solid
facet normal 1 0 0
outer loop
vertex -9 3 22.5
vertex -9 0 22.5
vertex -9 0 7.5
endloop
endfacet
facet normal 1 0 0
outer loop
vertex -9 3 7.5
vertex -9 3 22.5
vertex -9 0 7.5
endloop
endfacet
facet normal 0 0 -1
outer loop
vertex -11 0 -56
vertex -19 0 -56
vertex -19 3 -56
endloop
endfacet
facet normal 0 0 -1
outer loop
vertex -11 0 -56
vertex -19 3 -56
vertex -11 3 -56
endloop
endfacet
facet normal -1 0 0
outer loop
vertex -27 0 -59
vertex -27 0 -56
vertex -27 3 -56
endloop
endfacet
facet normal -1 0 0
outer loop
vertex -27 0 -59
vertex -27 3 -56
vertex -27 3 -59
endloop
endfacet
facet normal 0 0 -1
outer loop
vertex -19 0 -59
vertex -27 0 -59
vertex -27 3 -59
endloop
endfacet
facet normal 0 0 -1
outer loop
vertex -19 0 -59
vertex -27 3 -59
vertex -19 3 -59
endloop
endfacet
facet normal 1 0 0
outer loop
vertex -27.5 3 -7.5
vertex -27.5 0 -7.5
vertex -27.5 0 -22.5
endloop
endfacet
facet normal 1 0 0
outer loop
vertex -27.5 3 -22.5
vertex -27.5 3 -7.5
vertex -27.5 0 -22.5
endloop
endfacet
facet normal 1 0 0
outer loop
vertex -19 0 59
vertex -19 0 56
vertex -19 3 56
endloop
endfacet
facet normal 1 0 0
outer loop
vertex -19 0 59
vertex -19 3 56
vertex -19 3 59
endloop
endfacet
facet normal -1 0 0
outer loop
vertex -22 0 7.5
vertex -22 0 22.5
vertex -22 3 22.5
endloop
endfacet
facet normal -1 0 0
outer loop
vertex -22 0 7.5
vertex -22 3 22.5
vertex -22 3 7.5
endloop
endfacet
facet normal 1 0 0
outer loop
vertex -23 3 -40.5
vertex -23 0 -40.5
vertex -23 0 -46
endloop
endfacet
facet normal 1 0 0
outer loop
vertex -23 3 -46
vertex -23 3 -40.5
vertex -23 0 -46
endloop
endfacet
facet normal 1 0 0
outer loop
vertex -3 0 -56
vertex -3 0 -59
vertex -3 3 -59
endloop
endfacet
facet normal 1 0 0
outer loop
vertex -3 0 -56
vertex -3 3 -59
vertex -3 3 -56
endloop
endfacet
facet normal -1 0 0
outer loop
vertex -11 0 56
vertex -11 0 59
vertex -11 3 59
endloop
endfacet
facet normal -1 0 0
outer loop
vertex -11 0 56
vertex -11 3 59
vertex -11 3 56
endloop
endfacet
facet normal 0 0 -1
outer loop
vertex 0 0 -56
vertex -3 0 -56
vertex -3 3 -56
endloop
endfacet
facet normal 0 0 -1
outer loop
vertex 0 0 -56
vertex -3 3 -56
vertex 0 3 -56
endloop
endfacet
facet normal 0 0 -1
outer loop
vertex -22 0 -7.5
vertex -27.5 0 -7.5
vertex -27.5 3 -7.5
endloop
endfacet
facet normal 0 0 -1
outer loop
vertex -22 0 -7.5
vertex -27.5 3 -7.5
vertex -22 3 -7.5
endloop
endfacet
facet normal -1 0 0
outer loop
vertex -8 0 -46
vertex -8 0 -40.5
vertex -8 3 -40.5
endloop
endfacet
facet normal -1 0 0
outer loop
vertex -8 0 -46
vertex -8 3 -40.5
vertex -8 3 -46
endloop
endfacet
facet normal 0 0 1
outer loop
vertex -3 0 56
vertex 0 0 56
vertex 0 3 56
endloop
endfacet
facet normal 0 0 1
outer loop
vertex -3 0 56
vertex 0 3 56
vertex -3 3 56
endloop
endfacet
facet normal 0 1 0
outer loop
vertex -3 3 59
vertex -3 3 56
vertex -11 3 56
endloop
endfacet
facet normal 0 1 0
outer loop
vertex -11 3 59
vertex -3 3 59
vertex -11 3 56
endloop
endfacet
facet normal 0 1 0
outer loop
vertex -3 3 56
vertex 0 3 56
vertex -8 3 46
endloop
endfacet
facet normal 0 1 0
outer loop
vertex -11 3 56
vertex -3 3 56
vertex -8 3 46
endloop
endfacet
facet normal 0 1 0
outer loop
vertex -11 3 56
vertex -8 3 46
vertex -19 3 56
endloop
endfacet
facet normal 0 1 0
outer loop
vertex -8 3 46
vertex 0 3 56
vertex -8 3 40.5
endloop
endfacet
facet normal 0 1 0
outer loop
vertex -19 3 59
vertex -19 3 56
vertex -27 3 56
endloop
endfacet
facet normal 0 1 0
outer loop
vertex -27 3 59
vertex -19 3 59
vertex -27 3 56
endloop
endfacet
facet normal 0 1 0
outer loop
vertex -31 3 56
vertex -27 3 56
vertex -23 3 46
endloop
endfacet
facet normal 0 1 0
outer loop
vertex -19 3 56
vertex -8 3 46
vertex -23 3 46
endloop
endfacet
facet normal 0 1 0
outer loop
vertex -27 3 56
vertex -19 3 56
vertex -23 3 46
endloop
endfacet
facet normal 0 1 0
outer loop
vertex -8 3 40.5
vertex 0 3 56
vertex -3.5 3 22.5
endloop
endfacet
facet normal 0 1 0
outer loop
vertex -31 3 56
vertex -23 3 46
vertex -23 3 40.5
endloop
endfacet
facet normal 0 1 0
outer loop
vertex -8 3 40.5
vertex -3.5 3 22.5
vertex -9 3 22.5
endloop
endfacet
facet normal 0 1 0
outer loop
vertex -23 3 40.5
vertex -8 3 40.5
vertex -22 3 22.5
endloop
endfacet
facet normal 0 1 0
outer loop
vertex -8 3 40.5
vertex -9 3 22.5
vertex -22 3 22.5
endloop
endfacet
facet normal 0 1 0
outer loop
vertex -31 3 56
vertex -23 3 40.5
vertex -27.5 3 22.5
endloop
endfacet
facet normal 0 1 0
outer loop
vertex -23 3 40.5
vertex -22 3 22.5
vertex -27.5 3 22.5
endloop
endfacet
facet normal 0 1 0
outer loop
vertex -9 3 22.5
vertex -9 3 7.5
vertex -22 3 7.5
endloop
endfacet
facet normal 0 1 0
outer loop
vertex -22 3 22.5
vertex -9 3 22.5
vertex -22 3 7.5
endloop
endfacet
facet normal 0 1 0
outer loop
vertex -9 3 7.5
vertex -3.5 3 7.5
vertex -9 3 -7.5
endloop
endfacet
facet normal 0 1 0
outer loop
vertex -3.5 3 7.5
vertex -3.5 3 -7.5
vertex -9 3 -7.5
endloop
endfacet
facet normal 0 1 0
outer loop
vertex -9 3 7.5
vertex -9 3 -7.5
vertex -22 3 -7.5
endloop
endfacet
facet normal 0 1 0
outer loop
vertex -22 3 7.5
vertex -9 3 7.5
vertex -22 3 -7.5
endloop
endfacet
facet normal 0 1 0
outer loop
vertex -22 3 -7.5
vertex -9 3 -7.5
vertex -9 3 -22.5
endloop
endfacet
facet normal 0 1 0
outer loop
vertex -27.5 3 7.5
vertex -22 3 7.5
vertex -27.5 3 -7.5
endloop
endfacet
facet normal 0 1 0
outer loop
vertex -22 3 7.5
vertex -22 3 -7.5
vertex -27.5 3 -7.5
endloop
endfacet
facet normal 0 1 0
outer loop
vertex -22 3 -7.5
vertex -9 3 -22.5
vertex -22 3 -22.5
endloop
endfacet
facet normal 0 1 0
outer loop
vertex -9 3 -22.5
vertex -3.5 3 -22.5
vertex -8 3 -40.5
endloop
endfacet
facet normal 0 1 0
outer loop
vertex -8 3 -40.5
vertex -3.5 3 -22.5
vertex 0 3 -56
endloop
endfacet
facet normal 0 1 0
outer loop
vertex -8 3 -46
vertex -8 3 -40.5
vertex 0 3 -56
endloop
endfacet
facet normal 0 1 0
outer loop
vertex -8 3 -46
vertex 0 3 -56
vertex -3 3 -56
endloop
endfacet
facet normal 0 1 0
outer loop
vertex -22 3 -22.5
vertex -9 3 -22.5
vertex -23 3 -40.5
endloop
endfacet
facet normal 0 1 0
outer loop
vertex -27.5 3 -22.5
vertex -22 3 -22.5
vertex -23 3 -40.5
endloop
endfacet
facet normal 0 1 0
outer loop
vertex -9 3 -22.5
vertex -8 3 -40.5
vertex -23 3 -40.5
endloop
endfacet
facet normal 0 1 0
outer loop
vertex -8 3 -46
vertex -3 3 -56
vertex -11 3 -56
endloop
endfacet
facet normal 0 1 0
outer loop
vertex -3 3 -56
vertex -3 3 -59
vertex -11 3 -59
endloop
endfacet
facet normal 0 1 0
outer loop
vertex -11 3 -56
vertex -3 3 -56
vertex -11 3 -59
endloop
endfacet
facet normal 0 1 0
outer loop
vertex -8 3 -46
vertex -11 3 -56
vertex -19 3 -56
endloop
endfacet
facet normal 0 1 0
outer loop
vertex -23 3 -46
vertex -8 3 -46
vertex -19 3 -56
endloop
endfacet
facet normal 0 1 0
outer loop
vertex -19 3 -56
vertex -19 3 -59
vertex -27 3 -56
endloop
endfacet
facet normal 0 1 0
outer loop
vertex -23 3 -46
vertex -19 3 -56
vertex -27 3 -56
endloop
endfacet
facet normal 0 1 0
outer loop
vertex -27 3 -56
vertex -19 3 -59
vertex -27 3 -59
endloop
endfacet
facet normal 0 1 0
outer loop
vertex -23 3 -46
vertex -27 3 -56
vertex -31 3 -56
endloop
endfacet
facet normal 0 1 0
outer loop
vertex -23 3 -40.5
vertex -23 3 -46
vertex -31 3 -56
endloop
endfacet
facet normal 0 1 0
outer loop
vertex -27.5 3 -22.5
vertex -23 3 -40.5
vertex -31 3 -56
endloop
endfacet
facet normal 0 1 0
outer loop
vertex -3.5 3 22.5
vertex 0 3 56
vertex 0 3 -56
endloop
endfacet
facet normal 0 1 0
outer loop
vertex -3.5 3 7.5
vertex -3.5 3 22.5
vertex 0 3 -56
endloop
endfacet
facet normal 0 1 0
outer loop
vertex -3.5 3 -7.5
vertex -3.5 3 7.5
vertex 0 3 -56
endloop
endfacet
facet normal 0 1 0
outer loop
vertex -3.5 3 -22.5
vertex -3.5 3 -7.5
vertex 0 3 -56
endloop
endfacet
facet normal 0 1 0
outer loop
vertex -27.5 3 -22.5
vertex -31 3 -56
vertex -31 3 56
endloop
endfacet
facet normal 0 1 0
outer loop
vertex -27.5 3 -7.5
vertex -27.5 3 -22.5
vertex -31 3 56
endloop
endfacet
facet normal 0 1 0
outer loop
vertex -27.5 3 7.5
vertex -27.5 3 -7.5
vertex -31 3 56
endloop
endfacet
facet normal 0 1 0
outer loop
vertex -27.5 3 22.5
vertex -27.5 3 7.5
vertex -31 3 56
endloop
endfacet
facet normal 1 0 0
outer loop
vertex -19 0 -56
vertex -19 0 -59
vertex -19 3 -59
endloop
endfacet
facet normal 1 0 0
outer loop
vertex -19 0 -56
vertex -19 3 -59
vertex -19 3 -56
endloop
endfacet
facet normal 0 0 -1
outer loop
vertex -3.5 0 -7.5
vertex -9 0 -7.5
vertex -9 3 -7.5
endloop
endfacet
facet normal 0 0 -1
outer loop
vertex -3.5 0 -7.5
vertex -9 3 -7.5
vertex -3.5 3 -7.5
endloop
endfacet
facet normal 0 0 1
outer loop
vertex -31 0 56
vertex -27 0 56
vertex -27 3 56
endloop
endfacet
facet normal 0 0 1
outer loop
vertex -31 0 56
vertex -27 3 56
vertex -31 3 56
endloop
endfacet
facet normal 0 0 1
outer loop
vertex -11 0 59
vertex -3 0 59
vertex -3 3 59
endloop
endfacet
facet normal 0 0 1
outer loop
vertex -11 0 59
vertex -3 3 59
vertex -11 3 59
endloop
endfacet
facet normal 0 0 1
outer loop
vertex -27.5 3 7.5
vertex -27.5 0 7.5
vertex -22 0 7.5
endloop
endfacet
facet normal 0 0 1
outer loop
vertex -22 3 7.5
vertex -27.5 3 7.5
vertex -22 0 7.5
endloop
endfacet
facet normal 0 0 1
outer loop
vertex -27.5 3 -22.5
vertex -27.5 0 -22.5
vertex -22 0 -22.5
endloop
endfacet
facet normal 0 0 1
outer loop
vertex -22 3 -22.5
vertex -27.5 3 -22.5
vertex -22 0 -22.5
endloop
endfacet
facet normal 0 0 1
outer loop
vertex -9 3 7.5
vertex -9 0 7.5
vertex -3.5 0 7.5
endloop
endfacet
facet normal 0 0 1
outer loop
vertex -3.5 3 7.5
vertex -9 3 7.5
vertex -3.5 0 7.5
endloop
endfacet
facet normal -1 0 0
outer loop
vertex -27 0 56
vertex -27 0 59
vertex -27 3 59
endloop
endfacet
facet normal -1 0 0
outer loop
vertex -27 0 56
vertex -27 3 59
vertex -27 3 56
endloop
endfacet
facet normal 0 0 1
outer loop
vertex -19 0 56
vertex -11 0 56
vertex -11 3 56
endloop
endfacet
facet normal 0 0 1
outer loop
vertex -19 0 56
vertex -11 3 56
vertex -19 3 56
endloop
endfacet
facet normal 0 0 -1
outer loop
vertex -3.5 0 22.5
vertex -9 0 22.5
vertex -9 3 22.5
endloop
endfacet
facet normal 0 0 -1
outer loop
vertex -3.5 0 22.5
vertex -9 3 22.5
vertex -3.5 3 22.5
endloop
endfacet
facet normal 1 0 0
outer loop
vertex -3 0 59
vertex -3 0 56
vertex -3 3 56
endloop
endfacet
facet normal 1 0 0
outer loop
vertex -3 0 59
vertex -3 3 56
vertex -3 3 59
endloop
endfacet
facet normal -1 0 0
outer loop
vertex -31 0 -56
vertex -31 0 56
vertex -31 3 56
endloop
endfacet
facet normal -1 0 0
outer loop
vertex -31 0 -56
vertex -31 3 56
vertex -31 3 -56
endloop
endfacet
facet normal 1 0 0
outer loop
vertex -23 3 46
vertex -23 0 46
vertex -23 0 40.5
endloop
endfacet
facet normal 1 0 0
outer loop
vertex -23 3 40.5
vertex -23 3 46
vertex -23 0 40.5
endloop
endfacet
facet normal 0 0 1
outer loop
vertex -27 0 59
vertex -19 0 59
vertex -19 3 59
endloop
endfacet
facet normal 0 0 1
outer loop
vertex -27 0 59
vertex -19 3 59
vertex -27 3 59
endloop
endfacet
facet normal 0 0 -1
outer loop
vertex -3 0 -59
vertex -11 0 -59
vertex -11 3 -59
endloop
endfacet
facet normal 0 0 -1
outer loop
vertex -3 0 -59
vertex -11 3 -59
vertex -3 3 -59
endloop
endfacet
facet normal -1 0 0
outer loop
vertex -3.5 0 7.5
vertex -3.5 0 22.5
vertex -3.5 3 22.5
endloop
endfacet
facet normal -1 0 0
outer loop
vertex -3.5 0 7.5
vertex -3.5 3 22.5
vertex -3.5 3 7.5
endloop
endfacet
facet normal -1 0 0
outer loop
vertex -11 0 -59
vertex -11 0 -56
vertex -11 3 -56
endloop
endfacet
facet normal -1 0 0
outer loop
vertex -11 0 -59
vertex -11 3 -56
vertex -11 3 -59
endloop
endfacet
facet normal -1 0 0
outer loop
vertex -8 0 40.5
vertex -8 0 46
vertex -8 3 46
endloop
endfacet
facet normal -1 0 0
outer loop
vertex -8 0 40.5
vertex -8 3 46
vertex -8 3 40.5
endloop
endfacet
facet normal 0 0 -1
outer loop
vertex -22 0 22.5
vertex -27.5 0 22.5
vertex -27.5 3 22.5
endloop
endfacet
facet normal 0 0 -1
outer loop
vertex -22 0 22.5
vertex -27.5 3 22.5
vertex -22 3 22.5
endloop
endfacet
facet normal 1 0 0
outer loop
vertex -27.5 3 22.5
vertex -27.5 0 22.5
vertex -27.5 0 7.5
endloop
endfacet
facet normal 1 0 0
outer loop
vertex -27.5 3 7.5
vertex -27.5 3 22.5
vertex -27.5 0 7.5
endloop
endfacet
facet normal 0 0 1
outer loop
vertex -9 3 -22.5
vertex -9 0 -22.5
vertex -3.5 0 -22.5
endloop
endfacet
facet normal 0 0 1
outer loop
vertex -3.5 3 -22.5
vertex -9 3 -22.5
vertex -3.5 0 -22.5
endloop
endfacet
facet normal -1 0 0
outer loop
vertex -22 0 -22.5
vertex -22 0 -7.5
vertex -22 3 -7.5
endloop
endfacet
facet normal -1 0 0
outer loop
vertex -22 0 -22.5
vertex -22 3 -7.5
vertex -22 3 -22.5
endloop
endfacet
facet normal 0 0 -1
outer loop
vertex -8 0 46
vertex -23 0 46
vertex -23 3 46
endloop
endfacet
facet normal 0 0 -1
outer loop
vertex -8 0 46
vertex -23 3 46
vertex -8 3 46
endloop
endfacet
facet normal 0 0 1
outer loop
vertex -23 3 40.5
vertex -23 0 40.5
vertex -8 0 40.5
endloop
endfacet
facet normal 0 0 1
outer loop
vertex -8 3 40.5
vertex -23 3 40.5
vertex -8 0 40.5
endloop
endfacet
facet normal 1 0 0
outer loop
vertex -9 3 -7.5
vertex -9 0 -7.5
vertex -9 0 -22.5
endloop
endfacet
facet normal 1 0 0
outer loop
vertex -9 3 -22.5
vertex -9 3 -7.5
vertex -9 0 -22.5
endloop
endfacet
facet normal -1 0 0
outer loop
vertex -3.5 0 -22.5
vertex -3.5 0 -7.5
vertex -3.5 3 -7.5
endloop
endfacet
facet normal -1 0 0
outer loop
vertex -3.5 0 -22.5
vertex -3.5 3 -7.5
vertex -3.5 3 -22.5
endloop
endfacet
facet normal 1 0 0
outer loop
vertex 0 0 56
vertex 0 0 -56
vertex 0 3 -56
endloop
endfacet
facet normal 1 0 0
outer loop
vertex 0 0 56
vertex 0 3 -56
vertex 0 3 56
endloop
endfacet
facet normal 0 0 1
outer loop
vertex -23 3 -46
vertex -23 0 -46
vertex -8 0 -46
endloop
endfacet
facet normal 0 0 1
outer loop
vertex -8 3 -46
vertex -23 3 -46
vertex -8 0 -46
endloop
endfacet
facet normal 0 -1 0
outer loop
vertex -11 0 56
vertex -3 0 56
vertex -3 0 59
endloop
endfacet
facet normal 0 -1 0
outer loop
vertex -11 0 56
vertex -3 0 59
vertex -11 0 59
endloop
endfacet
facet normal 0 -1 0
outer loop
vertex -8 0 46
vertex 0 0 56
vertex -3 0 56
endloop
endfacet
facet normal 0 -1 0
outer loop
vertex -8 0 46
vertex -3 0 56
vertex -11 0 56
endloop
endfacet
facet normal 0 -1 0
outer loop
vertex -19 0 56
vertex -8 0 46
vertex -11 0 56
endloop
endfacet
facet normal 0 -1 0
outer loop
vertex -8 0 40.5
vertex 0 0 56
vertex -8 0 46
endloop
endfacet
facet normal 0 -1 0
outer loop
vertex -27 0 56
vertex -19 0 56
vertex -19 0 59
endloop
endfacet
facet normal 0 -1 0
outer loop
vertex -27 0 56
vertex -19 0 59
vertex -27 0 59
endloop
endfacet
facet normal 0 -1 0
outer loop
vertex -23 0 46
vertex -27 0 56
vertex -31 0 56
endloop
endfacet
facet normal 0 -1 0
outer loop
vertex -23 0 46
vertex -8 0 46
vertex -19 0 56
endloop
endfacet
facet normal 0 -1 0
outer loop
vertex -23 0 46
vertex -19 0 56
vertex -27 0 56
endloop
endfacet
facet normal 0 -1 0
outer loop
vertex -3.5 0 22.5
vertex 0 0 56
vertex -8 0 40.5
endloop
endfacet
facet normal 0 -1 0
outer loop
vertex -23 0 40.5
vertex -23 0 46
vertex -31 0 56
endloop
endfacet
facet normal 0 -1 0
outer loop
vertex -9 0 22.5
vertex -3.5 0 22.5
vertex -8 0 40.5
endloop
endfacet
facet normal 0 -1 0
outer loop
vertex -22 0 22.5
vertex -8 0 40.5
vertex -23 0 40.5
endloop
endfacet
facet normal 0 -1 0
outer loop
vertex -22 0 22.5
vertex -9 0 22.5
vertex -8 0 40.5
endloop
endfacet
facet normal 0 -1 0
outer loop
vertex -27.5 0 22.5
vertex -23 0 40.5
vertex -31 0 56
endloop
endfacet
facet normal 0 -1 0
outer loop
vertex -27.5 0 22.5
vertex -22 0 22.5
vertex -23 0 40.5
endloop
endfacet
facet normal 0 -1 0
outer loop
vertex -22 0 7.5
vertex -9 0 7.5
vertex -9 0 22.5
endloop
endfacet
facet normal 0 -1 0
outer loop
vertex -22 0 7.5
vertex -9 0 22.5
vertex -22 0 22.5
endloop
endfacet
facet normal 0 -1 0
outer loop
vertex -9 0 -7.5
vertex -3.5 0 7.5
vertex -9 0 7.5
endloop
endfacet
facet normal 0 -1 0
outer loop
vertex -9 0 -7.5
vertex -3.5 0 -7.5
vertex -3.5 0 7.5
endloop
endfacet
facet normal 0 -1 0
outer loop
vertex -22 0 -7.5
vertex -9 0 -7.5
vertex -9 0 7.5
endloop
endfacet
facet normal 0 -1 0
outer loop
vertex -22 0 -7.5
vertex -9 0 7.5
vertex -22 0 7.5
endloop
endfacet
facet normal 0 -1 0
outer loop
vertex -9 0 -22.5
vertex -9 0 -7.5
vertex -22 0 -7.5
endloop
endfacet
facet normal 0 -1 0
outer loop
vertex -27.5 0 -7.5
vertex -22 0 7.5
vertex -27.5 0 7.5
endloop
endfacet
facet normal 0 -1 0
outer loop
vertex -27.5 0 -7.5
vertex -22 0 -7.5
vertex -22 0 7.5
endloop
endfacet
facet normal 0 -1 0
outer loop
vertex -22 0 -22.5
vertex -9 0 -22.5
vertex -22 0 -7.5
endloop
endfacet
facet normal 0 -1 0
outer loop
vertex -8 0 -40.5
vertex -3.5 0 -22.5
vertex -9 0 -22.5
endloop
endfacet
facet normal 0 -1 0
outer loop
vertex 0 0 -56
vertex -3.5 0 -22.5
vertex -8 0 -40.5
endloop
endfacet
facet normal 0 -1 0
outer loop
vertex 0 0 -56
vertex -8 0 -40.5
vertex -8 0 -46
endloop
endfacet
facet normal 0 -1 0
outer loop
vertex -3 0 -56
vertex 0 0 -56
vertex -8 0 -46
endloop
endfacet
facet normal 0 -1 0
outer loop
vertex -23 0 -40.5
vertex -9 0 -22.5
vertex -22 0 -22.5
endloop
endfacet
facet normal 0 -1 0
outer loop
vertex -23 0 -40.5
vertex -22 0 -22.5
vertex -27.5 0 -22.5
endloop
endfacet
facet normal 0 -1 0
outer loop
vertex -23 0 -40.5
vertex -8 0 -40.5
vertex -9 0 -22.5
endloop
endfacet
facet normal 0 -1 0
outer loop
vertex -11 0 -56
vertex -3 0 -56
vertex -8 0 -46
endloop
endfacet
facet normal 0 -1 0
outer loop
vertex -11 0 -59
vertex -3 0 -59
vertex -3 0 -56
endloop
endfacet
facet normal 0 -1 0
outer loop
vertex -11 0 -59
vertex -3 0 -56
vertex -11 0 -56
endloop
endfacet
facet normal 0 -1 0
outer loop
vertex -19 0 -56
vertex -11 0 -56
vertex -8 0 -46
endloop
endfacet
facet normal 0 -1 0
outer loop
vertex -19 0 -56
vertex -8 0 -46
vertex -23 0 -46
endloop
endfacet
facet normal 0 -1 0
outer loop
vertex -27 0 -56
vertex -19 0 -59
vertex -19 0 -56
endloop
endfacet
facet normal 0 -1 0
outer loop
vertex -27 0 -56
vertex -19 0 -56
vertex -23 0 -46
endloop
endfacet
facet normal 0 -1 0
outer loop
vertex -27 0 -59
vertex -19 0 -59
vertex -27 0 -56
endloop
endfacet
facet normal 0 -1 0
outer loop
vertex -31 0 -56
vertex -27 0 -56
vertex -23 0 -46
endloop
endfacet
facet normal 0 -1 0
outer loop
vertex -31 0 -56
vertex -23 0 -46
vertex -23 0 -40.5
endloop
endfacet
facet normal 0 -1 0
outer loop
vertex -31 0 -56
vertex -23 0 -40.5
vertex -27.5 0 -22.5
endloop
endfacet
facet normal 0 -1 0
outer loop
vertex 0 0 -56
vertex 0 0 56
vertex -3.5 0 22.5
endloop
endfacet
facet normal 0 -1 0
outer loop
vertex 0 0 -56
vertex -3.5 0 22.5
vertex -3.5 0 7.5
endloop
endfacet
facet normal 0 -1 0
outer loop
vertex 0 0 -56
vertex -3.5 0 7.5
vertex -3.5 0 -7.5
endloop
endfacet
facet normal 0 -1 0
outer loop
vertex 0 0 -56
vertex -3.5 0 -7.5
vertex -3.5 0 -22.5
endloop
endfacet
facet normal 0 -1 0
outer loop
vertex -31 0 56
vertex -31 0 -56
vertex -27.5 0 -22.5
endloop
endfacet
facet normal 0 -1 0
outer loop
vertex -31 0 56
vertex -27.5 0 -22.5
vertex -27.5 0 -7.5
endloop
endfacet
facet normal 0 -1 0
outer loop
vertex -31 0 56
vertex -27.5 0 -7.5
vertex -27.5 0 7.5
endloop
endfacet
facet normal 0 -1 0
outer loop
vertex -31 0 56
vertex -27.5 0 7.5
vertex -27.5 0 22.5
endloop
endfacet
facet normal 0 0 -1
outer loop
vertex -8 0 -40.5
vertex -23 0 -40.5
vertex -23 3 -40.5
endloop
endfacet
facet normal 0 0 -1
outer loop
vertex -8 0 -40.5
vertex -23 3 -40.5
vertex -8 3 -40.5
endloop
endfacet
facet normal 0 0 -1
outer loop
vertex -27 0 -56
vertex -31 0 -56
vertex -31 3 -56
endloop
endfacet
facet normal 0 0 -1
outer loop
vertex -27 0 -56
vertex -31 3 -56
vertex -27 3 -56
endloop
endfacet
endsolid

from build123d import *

# Parameters (mm, degrees)
SKETCH1_W           = 15
SKETCH1_H           = 5.5
SKETCH1_W_2         = 5.5
SKETCH1_H_2         = 15
BOSS_EXTRUDE1_DEPTH = 3


with BuildPart() as part:
    # Sketch1 → Boss-Extrude1 (new body)
    with BuildSketch(Plane(origin=(0, 0, 0), x_dir=(1, 0, 0), z_dir=(0, 1, 0))):
        Polygon((0, 56), (0, -56), (-3, -56), (-3, -59), (-11, -59), (-11, -56), (-19, -56), (-19, -59), (-27, -59), (-27, -56), (-31, -56), (-31, 56), (-27, 56), (-27, 59), (-19, 59), (-19, 56), (-11, 56), (-11, 59), (-3, 59), (-3, 56), align=None)
        with Locations((-15.5, -43.25)):
            Rectangle(SKETCH1_W, SKETCH1_H, mode=Mode.SUBTRACT)
        with Locations((-24.75, -15)):
            Rectangle(SKETCH1_W_2, SKETCH1_H_2, mode=Mode.SUBTRACT)
        with Locations((-6.25, -15)):
            Rectangle(SKETCH1_W_2, SKETCH1_H_2, mode=Mode.SUBTRACT)
        with Locations((-24.75, 15)):
            Rectangle(SKETCH1_W_2, SKETCH1_H_2, mode=Mode.SUBTRACT)
        with Locations((-6.25, 15)):
            Rectangle(SKETCH1_W_2, SKETCH1_H_2, mode=Mode.SUBTRACT)
        with Locations((-15.5, 43.25)):
            Rectangle(SKETCH1_W, SKETCH1_H, mode=Mode.SUBTRACT)
    extrude(amount=BOSS_EXTRUDE1_DEPTH)


solid = part.part
